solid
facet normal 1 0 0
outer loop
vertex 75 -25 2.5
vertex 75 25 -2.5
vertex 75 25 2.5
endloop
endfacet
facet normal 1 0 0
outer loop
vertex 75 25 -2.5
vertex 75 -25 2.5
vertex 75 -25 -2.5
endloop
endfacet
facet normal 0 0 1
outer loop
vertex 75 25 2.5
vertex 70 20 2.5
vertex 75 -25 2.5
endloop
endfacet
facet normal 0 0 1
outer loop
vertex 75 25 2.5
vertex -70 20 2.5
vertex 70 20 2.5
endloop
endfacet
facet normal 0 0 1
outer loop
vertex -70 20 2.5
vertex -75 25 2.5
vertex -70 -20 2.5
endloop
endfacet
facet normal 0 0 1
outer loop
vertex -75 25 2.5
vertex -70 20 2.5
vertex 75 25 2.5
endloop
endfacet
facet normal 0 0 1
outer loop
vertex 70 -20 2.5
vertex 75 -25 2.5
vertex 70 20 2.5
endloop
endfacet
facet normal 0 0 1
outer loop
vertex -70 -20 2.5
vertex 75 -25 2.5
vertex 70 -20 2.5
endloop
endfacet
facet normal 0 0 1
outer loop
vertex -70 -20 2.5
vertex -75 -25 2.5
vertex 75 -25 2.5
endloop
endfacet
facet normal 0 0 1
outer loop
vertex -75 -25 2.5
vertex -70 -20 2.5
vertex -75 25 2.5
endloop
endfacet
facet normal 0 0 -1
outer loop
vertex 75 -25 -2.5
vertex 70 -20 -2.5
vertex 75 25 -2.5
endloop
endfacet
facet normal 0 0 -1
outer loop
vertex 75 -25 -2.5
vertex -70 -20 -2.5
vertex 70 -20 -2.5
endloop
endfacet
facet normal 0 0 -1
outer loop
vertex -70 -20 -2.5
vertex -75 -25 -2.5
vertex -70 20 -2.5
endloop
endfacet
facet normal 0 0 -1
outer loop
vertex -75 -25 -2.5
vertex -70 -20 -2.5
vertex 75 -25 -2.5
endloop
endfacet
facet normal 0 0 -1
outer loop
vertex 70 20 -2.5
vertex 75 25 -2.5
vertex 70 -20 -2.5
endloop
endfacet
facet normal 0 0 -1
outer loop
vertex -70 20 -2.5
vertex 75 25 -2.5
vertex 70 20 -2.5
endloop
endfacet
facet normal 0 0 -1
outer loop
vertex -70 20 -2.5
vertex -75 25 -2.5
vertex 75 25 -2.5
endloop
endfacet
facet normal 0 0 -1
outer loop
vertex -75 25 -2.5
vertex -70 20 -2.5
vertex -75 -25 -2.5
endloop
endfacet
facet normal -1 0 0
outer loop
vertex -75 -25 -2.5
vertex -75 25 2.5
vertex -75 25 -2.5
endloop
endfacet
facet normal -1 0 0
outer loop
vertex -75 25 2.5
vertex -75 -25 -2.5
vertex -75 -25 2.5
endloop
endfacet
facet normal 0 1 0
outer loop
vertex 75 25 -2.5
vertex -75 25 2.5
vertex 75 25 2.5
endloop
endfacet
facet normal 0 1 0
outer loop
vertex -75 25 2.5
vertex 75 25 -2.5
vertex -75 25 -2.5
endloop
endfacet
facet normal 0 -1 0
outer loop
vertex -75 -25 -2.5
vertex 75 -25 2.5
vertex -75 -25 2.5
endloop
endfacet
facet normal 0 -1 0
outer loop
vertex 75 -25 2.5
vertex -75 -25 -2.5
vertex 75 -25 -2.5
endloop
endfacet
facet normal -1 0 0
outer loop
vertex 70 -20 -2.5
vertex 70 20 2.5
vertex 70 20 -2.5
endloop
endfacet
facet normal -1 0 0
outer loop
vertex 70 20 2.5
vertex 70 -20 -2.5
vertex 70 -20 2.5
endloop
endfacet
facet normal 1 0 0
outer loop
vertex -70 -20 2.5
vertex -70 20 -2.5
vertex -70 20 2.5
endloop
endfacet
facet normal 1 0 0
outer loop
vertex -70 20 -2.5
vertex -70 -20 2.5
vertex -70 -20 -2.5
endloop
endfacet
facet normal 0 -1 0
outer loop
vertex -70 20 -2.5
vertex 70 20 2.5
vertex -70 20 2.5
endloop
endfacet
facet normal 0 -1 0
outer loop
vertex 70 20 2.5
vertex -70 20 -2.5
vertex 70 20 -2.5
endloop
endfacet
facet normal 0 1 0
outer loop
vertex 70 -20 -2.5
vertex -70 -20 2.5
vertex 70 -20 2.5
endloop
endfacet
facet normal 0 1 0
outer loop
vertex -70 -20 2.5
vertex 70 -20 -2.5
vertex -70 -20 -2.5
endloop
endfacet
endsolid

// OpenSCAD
difference() {
	cube(center = true, size = [150, 50, 5]);
	translate(v = [0, 0, 0.5000000000]) {
		cube(center = true, size = [140, 40, 6]);
	}
}
